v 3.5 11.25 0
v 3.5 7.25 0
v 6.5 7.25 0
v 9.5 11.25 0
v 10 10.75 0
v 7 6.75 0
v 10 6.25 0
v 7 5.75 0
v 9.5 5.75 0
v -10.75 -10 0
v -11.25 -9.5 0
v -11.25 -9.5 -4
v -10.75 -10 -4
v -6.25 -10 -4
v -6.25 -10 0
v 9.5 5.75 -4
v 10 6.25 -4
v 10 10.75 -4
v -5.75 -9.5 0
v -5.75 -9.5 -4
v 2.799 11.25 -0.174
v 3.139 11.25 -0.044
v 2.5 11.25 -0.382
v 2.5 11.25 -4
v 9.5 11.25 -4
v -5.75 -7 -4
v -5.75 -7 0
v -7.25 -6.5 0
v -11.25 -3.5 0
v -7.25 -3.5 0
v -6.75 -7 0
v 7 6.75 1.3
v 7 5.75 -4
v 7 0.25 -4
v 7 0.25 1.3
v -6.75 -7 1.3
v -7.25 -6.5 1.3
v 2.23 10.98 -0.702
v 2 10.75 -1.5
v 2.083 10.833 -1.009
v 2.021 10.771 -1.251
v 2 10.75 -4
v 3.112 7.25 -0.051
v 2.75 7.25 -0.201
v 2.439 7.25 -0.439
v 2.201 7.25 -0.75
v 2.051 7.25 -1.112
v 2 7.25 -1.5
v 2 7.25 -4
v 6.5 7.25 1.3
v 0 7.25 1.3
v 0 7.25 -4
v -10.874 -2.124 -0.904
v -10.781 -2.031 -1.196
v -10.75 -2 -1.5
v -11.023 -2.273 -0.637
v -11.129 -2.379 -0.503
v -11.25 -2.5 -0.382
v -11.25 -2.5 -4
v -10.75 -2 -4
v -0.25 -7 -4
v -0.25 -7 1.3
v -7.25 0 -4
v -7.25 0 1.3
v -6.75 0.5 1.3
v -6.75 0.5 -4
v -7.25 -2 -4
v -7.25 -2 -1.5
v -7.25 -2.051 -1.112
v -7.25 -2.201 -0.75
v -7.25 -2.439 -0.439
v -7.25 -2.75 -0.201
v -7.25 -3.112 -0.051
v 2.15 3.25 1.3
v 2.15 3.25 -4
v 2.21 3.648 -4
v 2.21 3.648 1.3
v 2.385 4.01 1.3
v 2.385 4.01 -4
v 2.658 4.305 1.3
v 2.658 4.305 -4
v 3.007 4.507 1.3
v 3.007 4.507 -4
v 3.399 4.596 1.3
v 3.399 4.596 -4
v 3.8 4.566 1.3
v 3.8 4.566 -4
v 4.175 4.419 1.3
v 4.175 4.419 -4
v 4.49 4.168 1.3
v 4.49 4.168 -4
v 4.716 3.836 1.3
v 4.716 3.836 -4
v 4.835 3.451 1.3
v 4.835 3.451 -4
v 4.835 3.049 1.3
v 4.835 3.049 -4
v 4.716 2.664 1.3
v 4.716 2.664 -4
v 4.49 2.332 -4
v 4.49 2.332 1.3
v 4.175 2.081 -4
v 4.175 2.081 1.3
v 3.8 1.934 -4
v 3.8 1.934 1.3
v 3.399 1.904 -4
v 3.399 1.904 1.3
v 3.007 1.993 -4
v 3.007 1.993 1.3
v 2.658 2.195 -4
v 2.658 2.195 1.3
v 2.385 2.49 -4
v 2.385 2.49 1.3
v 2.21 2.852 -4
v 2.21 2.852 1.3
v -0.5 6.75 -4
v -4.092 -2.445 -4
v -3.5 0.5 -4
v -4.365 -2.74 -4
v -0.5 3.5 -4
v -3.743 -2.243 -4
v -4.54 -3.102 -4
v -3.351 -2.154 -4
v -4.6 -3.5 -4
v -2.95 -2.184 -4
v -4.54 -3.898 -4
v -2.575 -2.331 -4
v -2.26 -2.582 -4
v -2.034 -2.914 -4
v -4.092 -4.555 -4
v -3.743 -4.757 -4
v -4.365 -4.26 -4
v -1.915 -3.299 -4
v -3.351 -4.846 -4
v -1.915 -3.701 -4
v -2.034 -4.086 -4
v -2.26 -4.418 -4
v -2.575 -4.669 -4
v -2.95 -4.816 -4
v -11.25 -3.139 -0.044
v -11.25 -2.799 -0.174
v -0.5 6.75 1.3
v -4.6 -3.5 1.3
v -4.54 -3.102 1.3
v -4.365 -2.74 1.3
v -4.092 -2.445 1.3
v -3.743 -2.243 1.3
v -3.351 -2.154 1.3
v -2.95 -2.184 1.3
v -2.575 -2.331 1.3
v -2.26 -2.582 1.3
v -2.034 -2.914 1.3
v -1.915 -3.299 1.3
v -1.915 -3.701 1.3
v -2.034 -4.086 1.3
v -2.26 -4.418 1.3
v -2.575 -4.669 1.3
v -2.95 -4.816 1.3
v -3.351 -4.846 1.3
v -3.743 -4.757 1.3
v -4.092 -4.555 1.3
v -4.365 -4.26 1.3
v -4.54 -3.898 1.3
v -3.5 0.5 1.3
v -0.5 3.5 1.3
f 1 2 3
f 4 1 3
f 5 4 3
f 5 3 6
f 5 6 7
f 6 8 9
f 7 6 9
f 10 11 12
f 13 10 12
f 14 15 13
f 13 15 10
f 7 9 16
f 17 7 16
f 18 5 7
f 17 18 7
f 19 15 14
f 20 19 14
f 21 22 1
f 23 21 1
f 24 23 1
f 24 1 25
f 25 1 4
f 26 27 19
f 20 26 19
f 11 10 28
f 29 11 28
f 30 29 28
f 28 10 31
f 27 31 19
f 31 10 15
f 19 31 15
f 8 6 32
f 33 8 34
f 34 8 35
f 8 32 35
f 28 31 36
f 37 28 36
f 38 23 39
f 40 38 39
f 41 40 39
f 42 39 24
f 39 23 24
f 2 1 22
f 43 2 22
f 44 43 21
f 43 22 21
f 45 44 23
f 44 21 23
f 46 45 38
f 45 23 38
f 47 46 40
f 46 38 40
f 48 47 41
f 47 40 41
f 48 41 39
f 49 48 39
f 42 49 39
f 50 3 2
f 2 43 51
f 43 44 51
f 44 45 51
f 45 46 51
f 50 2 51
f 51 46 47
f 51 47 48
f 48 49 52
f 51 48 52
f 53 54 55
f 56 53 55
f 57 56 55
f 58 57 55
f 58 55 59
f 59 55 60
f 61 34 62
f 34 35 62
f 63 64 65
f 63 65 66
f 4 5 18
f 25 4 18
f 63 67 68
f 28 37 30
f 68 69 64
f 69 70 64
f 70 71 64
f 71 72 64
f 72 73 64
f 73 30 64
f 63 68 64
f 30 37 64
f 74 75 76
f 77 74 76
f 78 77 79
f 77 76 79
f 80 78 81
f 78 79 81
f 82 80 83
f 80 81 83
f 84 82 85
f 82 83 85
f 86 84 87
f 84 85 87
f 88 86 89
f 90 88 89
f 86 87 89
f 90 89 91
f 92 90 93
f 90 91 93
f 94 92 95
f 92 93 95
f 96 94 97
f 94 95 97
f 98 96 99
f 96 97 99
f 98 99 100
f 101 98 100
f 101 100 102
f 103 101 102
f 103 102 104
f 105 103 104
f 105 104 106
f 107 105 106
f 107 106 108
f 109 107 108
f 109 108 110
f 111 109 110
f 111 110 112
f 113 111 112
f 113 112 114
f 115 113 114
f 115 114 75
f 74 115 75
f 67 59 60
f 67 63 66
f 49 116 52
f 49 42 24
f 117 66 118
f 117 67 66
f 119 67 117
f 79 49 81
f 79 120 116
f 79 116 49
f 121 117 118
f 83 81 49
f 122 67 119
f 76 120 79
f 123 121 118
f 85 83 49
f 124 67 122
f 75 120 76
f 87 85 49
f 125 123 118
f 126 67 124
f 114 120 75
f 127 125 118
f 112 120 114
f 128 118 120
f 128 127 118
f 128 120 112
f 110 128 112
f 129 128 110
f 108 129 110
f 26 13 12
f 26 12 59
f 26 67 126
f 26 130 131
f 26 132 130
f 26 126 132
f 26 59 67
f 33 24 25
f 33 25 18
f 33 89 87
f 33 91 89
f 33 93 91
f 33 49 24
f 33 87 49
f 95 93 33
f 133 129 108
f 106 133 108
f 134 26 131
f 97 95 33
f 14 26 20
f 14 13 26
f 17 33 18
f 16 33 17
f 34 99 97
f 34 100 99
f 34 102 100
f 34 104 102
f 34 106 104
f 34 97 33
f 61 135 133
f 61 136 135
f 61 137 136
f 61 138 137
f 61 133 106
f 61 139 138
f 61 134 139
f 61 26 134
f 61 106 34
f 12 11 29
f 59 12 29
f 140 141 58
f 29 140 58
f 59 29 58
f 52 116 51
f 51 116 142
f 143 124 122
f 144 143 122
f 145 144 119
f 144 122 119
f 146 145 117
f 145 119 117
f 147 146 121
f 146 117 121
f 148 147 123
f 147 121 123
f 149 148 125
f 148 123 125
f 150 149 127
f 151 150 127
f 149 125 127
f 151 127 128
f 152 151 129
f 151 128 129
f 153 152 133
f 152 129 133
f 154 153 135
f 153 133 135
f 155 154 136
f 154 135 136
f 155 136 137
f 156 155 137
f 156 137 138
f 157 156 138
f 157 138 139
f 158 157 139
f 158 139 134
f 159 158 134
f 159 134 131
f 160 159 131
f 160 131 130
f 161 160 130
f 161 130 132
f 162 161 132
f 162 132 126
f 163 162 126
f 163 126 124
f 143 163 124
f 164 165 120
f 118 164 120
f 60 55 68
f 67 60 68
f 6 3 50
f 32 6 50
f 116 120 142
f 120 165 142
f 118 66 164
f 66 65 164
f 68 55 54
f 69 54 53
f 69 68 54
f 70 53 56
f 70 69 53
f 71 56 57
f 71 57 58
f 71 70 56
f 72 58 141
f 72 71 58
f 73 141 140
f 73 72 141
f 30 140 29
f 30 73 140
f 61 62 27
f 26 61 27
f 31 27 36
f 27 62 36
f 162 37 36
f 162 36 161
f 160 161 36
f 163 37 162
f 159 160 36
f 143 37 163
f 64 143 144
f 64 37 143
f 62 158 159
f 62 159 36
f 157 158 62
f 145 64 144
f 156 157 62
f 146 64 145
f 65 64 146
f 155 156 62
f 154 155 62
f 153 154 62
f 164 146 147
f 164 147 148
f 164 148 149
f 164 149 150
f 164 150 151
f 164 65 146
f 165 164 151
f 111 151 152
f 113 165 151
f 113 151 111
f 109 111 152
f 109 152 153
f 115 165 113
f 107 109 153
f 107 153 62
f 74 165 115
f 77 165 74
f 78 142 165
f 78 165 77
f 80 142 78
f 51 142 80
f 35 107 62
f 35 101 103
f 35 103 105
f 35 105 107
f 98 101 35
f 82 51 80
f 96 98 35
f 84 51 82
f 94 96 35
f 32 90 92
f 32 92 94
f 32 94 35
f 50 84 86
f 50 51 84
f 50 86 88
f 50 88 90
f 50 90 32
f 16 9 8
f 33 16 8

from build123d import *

# Parameters (mm, degrees)
F1_DEPTH = 1.3
F3_DEPTH = 4
F4_SIZE  = 0.5
F5_SIZE  = 3
F6_R     = 1.5
F8_D     = 2.7


with BuildPart() as f1:
    # F0 (on Top) → F1 (new body)
    with BuildSketch(Plane.XY):
        Polygon((-7.25, -7), (-0.25, -7), (7, 0.25), (7, 7.25), (-0.5, 7.25), (-0.5, 0.5), (-7.25, 0.5), align=None)
    extrude(amount=F1_DEPTH)

    # F2 (on face) → F3 (join)
    with BuildSketch(Plane(origin=(0, 0, 0), x_dir=(1, 0, 0), z_dir=(0, 0, -1))):
        Polygon((7, -5.75), (7, -0.25), (-0.25, 7), (-5.75, 7), (-5.75, 10), (-11.25, 10), (-11.25, 2), (-7.25, 2), (-7.25, -0.5), (-0.5, -0.5), (-0.5, -7.25), (2, -7.25), (2, -11.25), (10, -11.25), (10, -5.75), align=None)
    extrude(amount=F3_DEPTH)

    # F4
    f4_edges = [f1.edges().sort_by_distance(p)[0] for p in [
        (-5.75, -10, -2),
        (-11.25, -10, -2),
        (-7.25, -7, 0.65),
        (-11.25, -2, -2),
        (-7.25, 0.5, -1.35),
        (-0.5, 7.25, -1.35),
        (2, 11.25, -2),
        (7, 7.25, 0.65),
        (10, 11.25, -2),
        (10, 5.75, -2),
    ]]
    chamfer(f4_edges, length=F4_SIZE)

    # F5
    f5_edges = [f1.edges().sort_by_distance(p)[0] for p in [
        (-0.5, 0.5, -1.35),
    ]]
    chamfer(f5_edges, length=F5_SIZE)

    # F6
    f6_edges = [f1.edges().sort_by_distance(p)[0] for p in [
        (2, 9, 0),
        (-9, -2, 0),
    ]]
    fillet(f6_edges, radius=F6_R)

    # F8 (through all)
    with Locations(Plane.XY.offset(1.3)):
        with Locations((3.5, 3.25), (-3.25, -3.5)):
            Hole(F8_D / 2)


solid = f1.part
